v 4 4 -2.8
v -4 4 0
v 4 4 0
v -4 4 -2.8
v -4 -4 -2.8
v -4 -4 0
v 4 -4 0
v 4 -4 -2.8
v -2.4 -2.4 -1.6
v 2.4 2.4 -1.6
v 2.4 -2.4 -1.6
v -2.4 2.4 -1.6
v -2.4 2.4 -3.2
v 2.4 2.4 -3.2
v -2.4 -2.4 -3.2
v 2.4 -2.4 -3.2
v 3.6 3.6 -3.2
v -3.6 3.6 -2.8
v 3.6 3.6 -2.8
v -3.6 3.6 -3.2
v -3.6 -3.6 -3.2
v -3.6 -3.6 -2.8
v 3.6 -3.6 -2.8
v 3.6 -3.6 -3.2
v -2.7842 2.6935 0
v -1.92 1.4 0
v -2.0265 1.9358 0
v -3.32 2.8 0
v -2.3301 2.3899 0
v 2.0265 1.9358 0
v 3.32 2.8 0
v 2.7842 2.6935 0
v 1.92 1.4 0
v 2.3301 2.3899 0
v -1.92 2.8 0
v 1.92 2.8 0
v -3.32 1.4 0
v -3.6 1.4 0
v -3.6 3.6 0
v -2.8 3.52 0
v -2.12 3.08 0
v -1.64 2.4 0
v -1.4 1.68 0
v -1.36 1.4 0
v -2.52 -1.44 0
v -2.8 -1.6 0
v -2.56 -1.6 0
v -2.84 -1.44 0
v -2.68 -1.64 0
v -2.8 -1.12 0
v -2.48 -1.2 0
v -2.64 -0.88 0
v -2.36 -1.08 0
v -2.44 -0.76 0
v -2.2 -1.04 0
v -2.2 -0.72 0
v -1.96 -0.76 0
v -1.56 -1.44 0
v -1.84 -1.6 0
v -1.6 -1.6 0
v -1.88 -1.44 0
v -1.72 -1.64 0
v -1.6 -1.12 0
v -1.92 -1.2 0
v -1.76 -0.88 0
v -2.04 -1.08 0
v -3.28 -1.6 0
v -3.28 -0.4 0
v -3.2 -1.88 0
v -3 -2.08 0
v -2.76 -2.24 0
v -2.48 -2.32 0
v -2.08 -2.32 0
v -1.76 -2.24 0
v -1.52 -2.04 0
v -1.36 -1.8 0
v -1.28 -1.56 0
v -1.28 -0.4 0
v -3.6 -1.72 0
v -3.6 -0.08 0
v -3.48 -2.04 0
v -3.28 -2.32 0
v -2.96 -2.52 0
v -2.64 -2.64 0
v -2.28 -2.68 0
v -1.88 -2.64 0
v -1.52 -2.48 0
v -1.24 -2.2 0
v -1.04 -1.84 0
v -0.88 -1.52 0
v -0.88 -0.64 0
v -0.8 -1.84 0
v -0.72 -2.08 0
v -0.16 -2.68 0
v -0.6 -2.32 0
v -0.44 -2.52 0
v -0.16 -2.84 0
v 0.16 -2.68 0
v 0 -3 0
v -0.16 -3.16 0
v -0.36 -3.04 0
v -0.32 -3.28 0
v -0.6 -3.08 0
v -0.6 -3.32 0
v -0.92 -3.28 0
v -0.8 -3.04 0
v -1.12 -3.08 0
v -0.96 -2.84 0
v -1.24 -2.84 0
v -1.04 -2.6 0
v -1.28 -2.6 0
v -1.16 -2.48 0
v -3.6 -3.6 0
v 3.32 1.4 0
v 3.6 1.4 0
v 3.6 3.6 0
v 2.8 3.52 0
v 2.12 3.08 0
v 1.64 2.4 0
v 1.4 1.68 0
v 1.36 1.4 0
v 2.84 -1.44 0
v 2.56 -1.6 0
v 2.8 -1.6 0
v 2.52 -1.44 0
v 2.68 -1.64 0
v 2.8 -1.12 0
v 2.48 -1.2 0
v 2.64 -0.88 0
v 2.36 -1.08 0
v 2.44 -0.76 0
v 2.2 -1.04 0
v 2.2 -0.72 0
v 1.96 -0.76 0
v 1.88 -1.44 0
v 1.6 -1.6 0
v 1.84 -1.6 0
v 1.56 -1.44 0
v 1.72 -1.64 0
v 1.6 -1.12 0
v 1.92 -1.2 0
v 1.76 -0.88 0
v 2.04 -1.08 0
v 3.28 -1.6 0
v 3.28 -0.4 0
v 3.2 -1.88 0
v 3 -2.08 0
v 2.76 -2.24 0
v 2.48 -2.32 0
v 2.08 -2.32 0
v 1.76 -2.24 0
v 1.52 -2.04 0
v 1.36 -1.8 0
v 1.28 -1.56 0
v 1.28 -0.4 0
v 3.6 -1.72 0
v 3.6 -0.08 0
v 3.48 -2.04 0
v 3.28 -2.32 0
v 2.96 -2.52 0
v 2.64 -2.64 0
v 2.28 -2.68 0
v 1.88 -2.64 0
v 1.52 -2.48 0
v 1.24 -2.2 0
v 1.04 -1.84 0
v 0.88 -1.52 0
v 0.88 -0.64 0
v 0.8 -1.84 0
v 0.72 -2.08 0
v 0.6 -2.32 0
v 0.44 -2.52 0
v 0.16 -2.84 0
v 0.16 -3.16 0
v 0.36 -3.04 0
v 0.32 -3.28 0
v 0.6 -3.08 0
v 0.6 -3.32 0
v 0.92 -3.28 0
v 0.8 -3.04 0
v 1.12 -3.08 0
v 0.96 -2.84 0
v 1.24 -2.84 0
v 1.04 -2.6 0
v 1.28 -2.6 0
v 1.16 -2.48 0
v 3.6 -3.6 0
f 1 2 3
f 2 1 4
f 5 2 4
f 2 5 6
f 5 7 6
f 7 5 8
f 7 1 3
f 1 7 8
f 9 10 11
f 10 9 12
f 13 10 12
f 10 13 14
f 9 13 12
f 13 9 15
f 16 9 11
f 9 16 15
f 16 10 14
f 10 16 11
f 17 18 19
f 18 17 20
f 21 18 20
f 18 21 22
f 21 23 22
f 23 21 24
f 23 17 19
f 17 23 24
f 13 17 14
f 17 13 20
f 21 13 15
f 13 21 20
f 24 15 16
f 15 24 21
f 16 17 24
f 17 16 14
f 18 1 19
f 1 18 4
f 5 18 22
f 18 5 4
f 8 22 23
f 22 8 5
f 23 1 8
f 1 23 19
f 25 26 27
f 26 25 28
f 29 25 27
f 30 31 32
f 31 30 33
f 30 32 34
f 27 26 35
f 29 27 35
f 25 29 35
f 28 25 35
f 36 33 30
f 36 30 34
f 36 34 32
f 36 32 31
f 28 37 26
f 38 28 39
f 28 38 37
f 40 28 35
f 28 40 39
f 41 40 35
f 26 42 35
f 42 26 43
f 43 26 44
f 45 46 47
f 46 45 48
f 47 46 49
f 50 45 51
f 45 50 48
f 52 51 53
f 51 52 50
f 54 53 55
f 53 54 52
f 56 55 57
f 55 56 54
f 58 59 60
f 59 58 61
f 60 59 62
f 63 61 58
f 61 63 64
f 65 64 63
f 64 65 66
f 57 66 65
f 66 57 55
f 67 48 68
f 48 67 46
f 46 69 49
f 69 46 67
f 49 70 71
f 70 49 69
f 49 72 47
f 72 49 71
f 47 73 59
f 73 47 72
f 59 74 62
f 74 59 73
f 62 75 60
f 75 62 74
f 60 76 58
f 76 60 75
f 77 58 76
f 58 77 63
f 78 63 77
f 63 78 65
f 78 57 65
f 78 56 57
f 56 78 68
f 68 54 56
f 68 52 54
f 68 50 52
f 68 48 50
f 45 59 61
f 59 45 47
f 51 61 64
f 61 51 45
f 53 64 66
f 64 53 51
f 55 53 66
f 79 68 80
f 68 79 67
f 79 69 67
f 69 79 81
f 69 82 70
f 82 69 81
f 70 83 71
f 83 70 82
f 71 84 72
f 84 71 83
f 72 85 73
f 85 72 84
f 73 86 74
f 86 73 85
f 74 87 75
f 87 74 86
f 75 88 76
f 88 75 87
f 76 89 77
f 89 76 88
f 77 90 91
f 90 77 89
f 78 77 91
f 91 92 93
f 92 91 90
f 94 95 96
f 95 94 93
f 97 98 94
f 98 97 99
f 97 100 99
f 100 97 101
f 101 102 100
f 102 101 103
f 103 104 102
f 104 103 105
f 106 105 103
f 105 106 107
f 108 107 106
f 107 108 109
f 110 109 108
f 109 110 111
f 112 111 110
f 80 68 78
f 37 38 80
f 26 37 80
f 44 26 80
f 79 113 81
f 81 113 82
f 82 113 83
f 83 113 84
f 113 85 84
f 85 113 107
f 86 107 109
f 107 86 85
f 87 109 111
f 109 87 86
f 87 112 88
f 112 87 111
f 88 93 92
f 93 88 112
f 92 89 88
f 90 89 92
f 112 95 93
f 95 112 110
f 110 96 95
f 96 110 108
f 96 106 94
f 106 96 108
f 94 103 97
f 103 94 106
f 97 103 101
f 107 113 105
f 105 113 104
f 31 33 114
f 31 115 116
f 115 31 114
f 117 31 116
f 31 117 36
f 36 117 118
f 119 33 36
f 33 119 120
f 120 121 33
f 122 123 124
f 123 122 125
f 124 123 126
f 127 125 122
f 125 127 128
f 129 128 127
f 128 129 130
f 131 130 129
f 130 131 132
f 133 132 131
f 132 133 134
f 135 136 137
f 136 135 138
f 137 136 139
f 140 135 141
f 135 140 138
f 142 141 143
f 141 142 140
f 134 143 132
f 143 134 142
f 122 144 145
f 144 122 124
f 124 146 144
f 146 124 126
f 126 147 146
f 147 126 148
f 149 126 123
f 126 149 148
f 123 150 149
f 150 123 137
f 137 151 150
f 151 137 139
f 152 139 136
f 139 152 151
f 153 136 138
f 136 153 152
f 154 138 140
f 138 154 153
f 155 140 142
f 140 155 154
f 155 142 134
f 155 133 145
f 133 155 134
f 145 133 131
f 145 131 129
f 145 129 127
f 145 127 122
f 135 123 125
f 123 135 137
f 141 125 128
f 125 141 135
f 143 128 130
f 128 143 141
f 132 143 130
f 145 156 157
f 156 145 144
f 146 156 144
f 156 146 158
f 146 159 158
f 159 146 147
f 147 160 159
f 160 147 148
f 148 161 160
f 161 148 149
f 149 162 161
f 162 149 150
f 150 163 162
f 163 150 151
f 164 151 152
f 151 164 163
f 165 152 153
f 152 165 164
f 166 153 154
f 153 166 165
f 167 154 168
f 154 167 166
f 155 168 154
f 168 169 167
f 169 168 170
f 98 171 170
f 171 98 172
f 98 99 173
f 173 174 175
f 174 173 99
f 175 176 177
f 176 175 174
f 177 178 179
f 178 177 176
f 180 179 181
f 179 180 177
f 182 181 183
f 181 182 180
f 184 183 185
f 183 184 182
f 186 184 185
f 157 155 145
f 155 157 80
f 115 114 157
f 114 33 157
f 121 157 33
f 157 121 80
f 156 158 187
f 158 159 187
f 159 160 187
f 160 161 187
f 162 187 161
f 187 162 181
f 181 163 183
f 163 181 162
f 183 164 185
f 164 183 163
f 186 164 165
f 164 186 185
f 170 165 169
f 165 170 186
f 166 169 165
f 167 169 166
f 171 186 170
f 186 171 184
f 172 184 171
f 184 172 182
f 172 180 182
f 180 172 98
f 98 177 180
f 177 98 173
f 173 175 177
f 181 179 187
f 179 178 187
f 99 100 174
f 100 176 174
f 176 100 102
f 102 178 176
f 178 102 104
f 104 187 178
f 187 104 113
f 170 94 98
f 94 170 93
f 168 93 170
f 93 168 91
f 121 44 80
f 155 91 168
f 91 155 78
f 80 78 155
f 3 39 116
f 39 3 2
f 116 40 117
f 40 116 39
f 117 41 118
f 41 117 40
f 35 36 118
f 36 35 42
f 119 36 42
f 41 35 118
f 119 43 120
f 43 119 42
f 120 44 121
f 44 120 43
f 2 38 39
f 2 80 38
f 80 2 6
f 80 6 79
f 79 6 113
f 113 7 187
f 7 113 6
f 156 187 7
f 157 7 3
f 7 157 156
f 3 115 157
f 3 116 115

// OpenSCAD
// file: ../p/box5.scad
use <../lib.scad>
function ldraw_lib__box5() = [
// 0 Box with 5 Faces and All Edges
// 0 Name: box5.dat
// 0 Author: James Jessiman
// 0 !LDRAW_ORG Primitive UPDATE 2012-01
// 0 !LICENSE Licensed under CC BY 4.0 : see CAreadme.txt
// 
// 0 BFC CERTIFY CCW
  [0,"BFC","CERTIFY"],
  [0,"BFC","CCW"],
// 
// 0 !HISTORY 2002-04-03 [sbliss] Modified for BFC compliance
// 0 !HISTORY 2002-04-25 [PTadmin] Official Update 2002-02
// 0 !HISTORY 2007-06-24 [PTadmin] Header formatted for Contributor Agreement
// 0 !HISTORY 2008-07-01 [PTadmin] Official Update 2008-01
// 0 !HISTORY 2012-02-16 [Philo] Changed to CCW
// 0 !HISTORY 2012-03-30 [PTadmin] Official Update 2012-01
// 
// 
// 2 24 1 1 1 -1 1 1
  [2,24,1,1,1,-1,1,1],
// 2 24 -1 1 1 -1 1 -1
  [2,24,-1,1,1,-1,1,-1],
// 2 24 -1 1 -1 1 1 -1
  [2,24,-1,1,-1,1,1,-1],
// 2 24 1 1 -1 1 1 1
  [2,24,1,1,-1,1,1,1],
// 2 24 1 0 1 -1 0 1
  [2,24,1,0,1,-1,0,1],
// 2 24 -1 0 1 -1 0 -1
  [2,24,-1,0,1,-1,0,-1],
// 2 24 -1 0 -1 1 0 -1
  [2,24,-1,0,-1,1,0,-1],
// 2 24 1 0 -1 1 0 1
  [2,24,1,0,-1,1,0,1],
// 2 24 1 0 1 1 1 1
  [2,24,1,0,1,1,1,1],
// 2 24 -1 0 1 -1 1 1
  [2,24,-1,0,1,-1,1,1],
// 2 24 1 0 -1 1 1 -1
  [2,24,1,0,-1,1,1,-1],
// 2 24 -1 0 -1 -1 1 -1
  [2,24,-1,0,-1,-1,1,-1],
// 4 16 -1 1 1 1 1 1 1 1 -1 -1 1 -1
  [4,16,-1,1,1,1,1,1,1,1,-1,-1,1,-1],
// 4 16 -1 1 1 -1 0 1 1 0 1 1 1 1
  [4,16,-1,1,1,-1,0,1,1,0,1,1,1,1],
// 4 16 -1 1 -1 -1 0 -1 -1 0 1 -1 1 1
  [4,16,-1,1,-1,-1,0,-1,-1,0,1,-1,1,1],
// 4 16 1 1 -1 1 0 -1 -1 0 -1 -1 1 -1
  [4,16,1,1,-1,1,0,-1,-1,0,-1,-1,1,-1],
// 4 16 1 1 1 1 0 1 1 0 -1 1 1 -1
  [4,16,1,1,1,1,0,1,1,0,-1,1,1,-1],
];
module ldraw_lib__box5(step=0, col=false, unit=2/5, alt=false, line=0.2, solid=!$preview)
    makepoly(ldraw_lib__box5(), step=step, col=col, unit=unit, alt=alt, line=line, solid=solid);
ldraw_lib__box5(line=0.2);
// file: ../p/box4.scad
use <../lib.scad>
function ldraw_lib__box4() = [
// 0 Box with 4 Faces (2 Parallel Pairs) and All Edges
// 0 Name: box4.dat
// 0 Author: James Jessiman
// 0 !LDRAW_ORG Primitive UPDATE 2012-01
// 0 !LICENSE Licensed under CC BY 4.0 : see CAreadme.txt
// 
// 0 BFC CERTIFY CCW
  [0,"BFC","CERTIFY"],
  [0,"BFC","CCW"],
// 
// 0 !HISTORY 2002-04-03 [sbliss] Modified for BFC compliance
// 0 !HISTORY 2002-04-25 [PTadmin] Official Update 2002-02
// 0 !HISTORY 2007-06-24 [PTadmin] Header formatted for Contributor Agreement
// 0 !HISTORY 2008-07-01 [PTadmin] Official Update 2008-01
// 0 !HISTORY 2012-02-16 [Philo] Changed to CCW
// 0 !HISTORY 2012-03-30 [PTadmin] Official Update 2012-01
// 
// 
// 2 24 1 1 1 -1 1 1
  [2,24,1,1,1,-1,1,1],
// 2 24 -1 1 1 -1 1 -1
  [2,24,-1,1,1,-1,1,-1],
// 2 24 -1 1 -1 1 1 -1
  [2,24,-1,1,-1,1,1,-1],
// 2 24 1 1 -1 1 1 1
  [2,24,1,1,-1,1,1,1],
// 2 24 1 0 1 -1 0 1
  [2,24,1,0,1,-1,0,1],
// 2 24 -1 0 1 -1 0 -1
  [2,24,-1,0,1,-1,0,-1],
// 2 24 -1 0 -1 1 0 -1
  [2,24,-1,0,-1,1,0,-1],
// 2 24 1 0 -1 1 0 1
  [2,24,1,0,-1,1,0,1],
// 2 24 1 0 1 1 1 1
  [2,24,1,0,1,1,1,1],
// 2 24 -1 0 1 -1 1 1
  [2,24,-1,0,1,-1,1,1],
// 2 24 1 0 -1 1 1 -1
  [2,24,1,0,-1,1,1,-1],
// 2 24 -1 0 -1 -1 1 -1
  [2,24,-1,0,-1,-1,1,-1],
// 4 16 -1 1 1 -1 0 1 1 0 1 1 1 1
  [4,16,-1,1,1,-1,0,1,1,0,1,1,1,1],
// 4 16 -1 1 -1 -1 0 -1 -1 0 1 -1 1 1
  [4,16,-1,1,-1,-1,0,-1,-1,0,1,-1,1,1],
// 4 16 1 1 -1 1 0 -1 -1 0 -1 -1 1 -1
  [4,16,1,1,-1,1,0,-1,-1,0,-1,-1,1,-1],
// 4 16 1 1 1 1 0 1 1 0 -1 1 1 -1
  [4,16,1,1,1,1,0,1,1,0,-1,1,1,-1],
];
module ldraw_lib__box4(step=0, col=false, unit=2/5, alt=false, line=0.2, solid=!$preview)
    makepoly(ldraw_lib__box4(), step=step, col=col, unit=unit, alt=alt, line=line, solid=solid);
ldraw_lib__box4(line=0.2);
// file: s/3070bs01.scad
use <../../lib.scad>
use <../../p/box4.scad>
use <../../p/box5.scad>
function ldraw_lib__s__3070bs01() = [
// 0 ~Tile  1 x  1 with Groove without Top Face
// 0 Name: s\3070bs01.dat
// 0 Author: Chris Dee [cwdee]
// 0 !LDRAW_ORG Subpart UPDATE 2009-02
// 0 !LICENSE Licensed under CC BY 4.0 : see CAreadme.txt
// 
// 0 BFC CERTIFY CCW
  [0,"BFC","CERTIFY"],
  [0,"BFC","CCW"],
// 
// 0 !HISTORY 2009-09-03 [PTadmin] Official Update 2009-02
// 
// 
// 1 16 0 0 0 10 0 0 0 7 0 0 0 10 box4.dat
  [1,16,0,0,0,10,0,0,0,7,0,0,0,10, ldraw_lib__box4()],
// 0 BFC INVERTNEXT
  [0,"BFC","INVERTNEXT"],
// 1 16 0 8 0 6 0 0 0 -4 0 0 0 6 box5.dat
  [1,16,0,8,0,6,0,0,0,-4,0,0,0,6, ldraw_lib__box5()],
// 1 16 0 7 0 9 0 0 0 1 0 0 0 9 box4.dat
  [1,16,0,7,0,9,0,0,0,1,0,0,0,9, ldraw_lib__box4()],
// 
// 4 16 9 8 9 6 8 6 -6 8 6 -9 8 9
  [4,16,9,8,9,6,8,6,-6,8,6,-9,8,9],
// 4 16 -9 8 9 -6 8 6 -6 8 -6 -9 8 -9
  [4,16,-9,8,9,-6,8,6,-6,8,-6,-9,8,-9],
// 4 16 -9 8 -9 -6 8 -6 6 8 -6 9 8 -9
  [4,16,-9,8,-9,-6,8,-6,6,8,-6,9,8,-9],
// 4 16 9 8 -9 6 8 -6 6 8 6 9 8 9
  [4,16,9,8,-9,6,8,-6,6,8,6,9,8,9],
// 
// 4 16 10 7 10 9 7 9 -9 7 9 -10 7 10
  [4,16,10,7,10,9,7,9,-9,7,9,-10,7,10],
// 4 16 -10 7 10 -9 7 9 -9 7 -9 -10 7 -10
  [4,16,-10,7,10,-9,7,9,-9,7,-9,-10,7,-10],
// 4 16 -10 7 -10 -9 7 -9 9 7 -9 10 7 -10
  [4,16,-10,7,-10,-9,7,-9,9,7,-9,10,7,-10],
// 4 16 10 7 -10 9 7 -9 9 7 9 10 7 10
  [4,16,10,7,-10,9,7,-9,9,7,9,10,7,10],
// 0
];
module ldraw_lib__s__3070bs01(step=0, col=false, unit=2/5, alt=false, line=0.2, solid=!$preview)
    makepoly(ldraw_lib__s__3070bs01(), step=step, col=col, unit=unit, alt=alt, line=line, solid=solid);
ldraw_lib__s__3070bs01(line=0.2);
// file: ../p/1-4ndis.scad
use <../lib.scad>
function ldraw_lib__1_4ndis() = [
// 0 Disc Negative 0.25
// 0 Name: 1-4ndis.dat
// 0 Author: James Jessiman
// 0 !LDRAW_ORG Primitive UPDATE 2012-01
// 0 !LICENSE Licensed under CC BY 4.0 : see CAreadme.txt
// 
// 0 BFC CERTIFY CCW
  [0,"BFC","CERTIFY"],
  [0,"BFC","CCW"],
// 
// 0 !HISTORY 2002-03-23 [sbliss] Added BFC Statement
// 0 !HISTORY 2002-04-25 [PTadmin] Official Update 2002-02
// 0 !HISTORY 2007-06-22 [PTadmin] Header formatted for Contributor Agreement
// 0 !HISTORY 2008-07-01 [PTadmin] Official Update 2008-01
// 0 !HISTORY 2012-02-16 [Philo] Changed to CCW
// 0 !HISTORY 2012-03-30 [PTadmin] Official Update 2012-01
// 
// 
// 3 16 0.9239 0 0.3827 1 0 0 1 0 1
  [3,16,0.9239,0,0.3827,1,0,0,1,0,1],
// 3 16 0.7071 0 0.7071 0.9239 0 0.3827 1 0 1
  [3,16,0.7071,0,0.7071,0.9239,0,0.3827,1,0,1],
// 3 16 0.3827 0 0.9239 0.7071 0 0.7071 1 0 1
  [3,16,0.3827,0,0.9239,0.7071,0,0.7071,1,0,1],
// 3 16 0 0 1 0.3827 0 0.9239 1 0 1
  [3,16,0,0,1,0.3827,0,0.9239,1,0,1],
];
module ldraw_lib__1_4ndis(step=0, col=false, unit=2/5, alt=false, line=0.2, solid=!$preview)
    makepoly(ldraw_lib__1_4ndis(), step=step, col=col, unit=unit, alt=alt, line=line, solid=solid);
ldraw_lib__1_4ndis(line=0.2);
// file: ../p/1-4chrd.scad
use <../lib.scad>
function ldraw_lib__1_4chrd() = [
// 0 Chord 0.25
// 0 Name: 1-4chrd.dat
// 0 Author: Max Martin Richter [MMR1988]
// 0 !LDRAW_ORG Primitive UPDATE 2023-05
// 0 !LICENSE Licensed under CC BY 4.0 : see CAreadme.txt
// 
// 0 BFC CERTIFY CCW
  [0,"BFC","CERTIFY"],
  [0,"BFC","CCW"],
// 
// 0 !HISTORY 2004-04-22 [PTadmin] Official Update 2004-02
// 0 !HISTORY 2007-10-09 [PTadmin] Header formatted for Contributor Agreement
// 0 !HISTORY 2008-07-01 [PTadmin] Official Update 2008-01
// 0 !HISTORY 2012-08-02 [MMR1988] Re-creation with PrimGen2 and Rectifier
// 0 !HISTORY 2012-08-09 [PTadmin] Official Update 2012-02
// 0 !HISTORY 2023-10-27 [OrionP] Change author to MMR1988 from hafhead
// 0 !HISTORY 2023-10-31 [OrionP] Official Update 2023-05
// 
// 4 16 0.9239 0 0.3827 0.3827 0 0.9239 0 0 1 1 0 0
  [4,16,0.9239,0,0.3827,0.3827,0,0.9239,0,0,1,1,0,0],
// 3 16 0.7071 0 0.7071 0.3827 0 0.9239 0.9239 0 0.3827
  [3,16,0.7071,0,0.7071,0.3827,0,0.9239,0.9239,0,0.3827],
];
module ldraw_lib__1_4chrd(step=0, col=false, unit=2/5, alt=false, line=0.2, solid=!$preview)
    makepoly(ldraw_lib__1_4chrd(), step=step, col=col, unit=unit, alt=alt, line=line, solid=solid);
ldraw_lib__1_4chrd(line=0.2);
// main file
use <../lib.scad>
use <../p/1-4chrd.scad>
use <../p/1-4ndis.scad>
use <s/3070bs01.scad>
function ldraw_lib__3070bp1h() = [
// 0 Tile  1 x  1 with Orange Fox Head, Closed Eyes and Blue and Medium Azure Glasses Pattern
// 0 Name: 3070bp1h.dat
// 0 Author: Takeshi Takahashi [RainbowDolphin]
// 0 !LDRAW_ORG Part UPDATE 2025-08
// 0 !LICENSE Licensed under CC BY 4.0 : see CAreadme.txt
// 
// 0 BFC CERTIFY CCW
  [0,"BFC","CERTIFY"],
  [0,"BFC","CCW"],
// 
// 0 !KEYWORDS adventure, BrickLink 3070pb205, Dots, Rebrickable 3070bpr0225
// 0 !KEYWORDS Set 41918
// 
// 0 !HISTORY 2025-08-31 [OrionP] Official Update 2025-08
// 
// 1 16 0 0 0 1 0 0 0 1 0 0 0 1 s\3070bs01.dat
  [1,16,0,0,0,1,0,0,0,1,0,0,0,1, ldraw_lib__s__3070bs01()],
// 1 15 -8.3 0 3.5 3.5 0 0 0 1 0 0 0 3.5 1-4chrd.dat
  [1,15,-8.3,0,3.5,3.5,0,0,0,1,0,0,0,3.5, ldraw_lib__1_4chrd()],
// 1 15 8.3 0 3.5 -3.5 0 0 0 1 0 0 0 3.5 1-4chrd.dat
  [1,15,8.3,0,3.5,-3.5,0,0,0,1,0,0,0,3.5, ldraw_lib__1_4chrd()],
// 1 0 -8.3 0 3.5 3.5 0 0 0 1 0 0 0 3.5 1-4ndis.dat
  [1,0,-8.3,0,3.5,3.5,0,0,0,1,0,0,0,3.5, ldraw_lib__1_4ndis()],
// 1 0 8.3 0 3.5 -3.5 0 0 0 1 0 0 0 3.5 1-4ndis.dat
  [1,0,8.3,0,3.5,-3.5,0,0,0,1,0,0,0,3.5, ldraw_lib__1_4ndis()],
// 3 15 -8.3 0 7 -8.3 0 3.5 -4.8 0 3.5
  [3,15,-8.3,0,7,-8.3,0,3.5,-4.8,0,3.5],
// 4 0 -9 0 3.5 -8.3 0 3.5 -8.3 0 7 -9 0 9
  [4,0,-9,0,3.5,-8.3,0,3.5,-8.3,0,7,-9,0,9],
// 4 0 -7 0 8.8 -9 0 9 -8.3 0 7 -4.8 0 7
  [4,0,-7,0,8.8,-9,0,9,-8.3,0,7,-4.8,0,7],
// 3 0 -5.3 0 7.7 -7 0 8.8 -4.8 0 7
  [3,0,-5.3,0,7.7,-7,0,8.8,-4.8,0,7],
// 4 0 -3.5 0 4.2 -4.1 0 6 -4.8 0 7 -4.8 0 3.5
  [4,0,-3.5,0,4.2,-4.1,0,6,-4.8,0,7,-4.8,0,3.5],
// 3 0 -3.5 0 4.2 -4.8 0 3.5 -3.4 0 3.5
  [3,0,-3.5,0,4.2,-4.8,0,3.5,-3.4,0,3.5],
// 4 0 -6.3 0 -3.6 -7.1 0 -3.6 -7 0 -4 -6.4 0 -4
  [4,0,-6.3,0,-3.6,-7.1,0,-3.6,-7,0,-4,-6.4,0,-4],
// 3 0 -6.4 0 -4 -7 0 -4 -6.7 0 -4.1
  [3,0,-6.4,0,-4,-7,0,-4,-6.7,0,-4.1],
// 4 0 -7 0 -2.8 -7.1 0 -3.6 -6.3 0 -3.6 -6.2 0 -3
  [4,0,-7,0,-2.8,-7.1,0,-3.6,-6.3,0,-3.6,-6.2,0,-3],
// 4 0 -6.6 0 -2.2 -7 0 -2.8 -6.2 0 -3 -5.9 0 -2.7
  [4,0,-6.6,0,-2.2,-7,0,-2.8,-6.2,0,-3,-5.9,0,-2.7],
// 4 0 -6.1 0 -1.9 -6.6 0 -2.2 -5.9 0 -2.7 -5.5 0 -2.6
  [4,0,-6.1,0,-1.9,-6.6,0,-2.2,-5.9,0,-2.7,-5.5,0,-2.6],
// 4 0 -5.5 0 -1.8 -6.1 0 -1.9 -5.5 0 -2.6 -4.9 0 -1.9
  [4,0,-5.5,0,-1.8,-6.1,0,-1.9,-5.5,0,-2.6,-4.9,0,-1.9],
// 4 0 -4 0 -4 -3.9 0 -3.6 -4.7 0 -3.6 -4.6 0 -4
  [4,0,-4,0,-4,-3.9,0,-3.6,-4.7,0,-3.6,-4.6,0,-4],
// 3 0 -4 0 -4 -4.6 0 -4 -4.3 0 -4.1
  [3,0,-4,0,-4,-4.6,0,-4,-4.3,0,-4.1],
// 4 0 -4.7 0 -3.6 -3.9 0 -3.6 -4 0 -2.8 -4.8 0 -3
  [4,0,-4.7,0,-3.6,-3.9,0,-3.6,-4,0,-2.8,-4.8,0,-3],
// 4 0 -4.8 0 -3 -4 0 -2.8 -4.4 0 -2.2 -5.1 0 -2.7
  [4,0,-4.8,0,-3,-4,0,-2.8,-4.4,0,-2.2,-5.1,0,-2.7],
// 4 0 -5.1 0 -2.7 -4.4 0 -2.2 -4.9 0 -1.9 -5.5 0 -2.6
  [4,0,-5.1,0,-2.7,-4.4,0,-2.2,-4.9,0,-1.9,-5.5,0,-2.6],
// 4 322 -7.1 0 -3.6 -8.2 0 -1 -8.2 0 -4 -7 0 -4
  [4,322,-7.1,0,-3.6,-8.2,0,-1,-8.2,0,-4,-7,0,-4],
// 4 322 -7 0 -4 -8.2 0 -4 -8 0 -4.7 -6.7 0 -4.1
  [4,322,-7,0,-4,-8.2,0,-4,-8,0,-4.7,-6.7,0,-4.1],
// 4 322 -6.7 0 -4.1 -8 0 -4.7 -7.5 0 -5.2 -6.9 0 -5.6
  [4,322,-6.7,0,-4.1,-8,0,-4.7,-7.5,0,-5.2,-6.9,0,-5.6],
// 4 322 -6.4 0 -4 -6.7 0 -4.1 -6.9 0 -5.6 -6.2 0 -5.8
  [4,322,-6.4,0,-4,-6.7,0,-4.1,-6.9,0,-5.6,-6.2,0,-5.8],
// 4 322 -4.6 0 -4 -6.4 0 -4 -6.2 0 -5.8 -5.2 0 -5.8
  [4,322,-4.6,0,-4,-6.4,0,-4,-6.2,0,-5.8,-5.2,0,-5.8],
// 4 322 -4.3 0 -4.1 -4.6 0 -4 -5.2 0 -5.8 -4.4 0 -5.6
  [4,322,-4.3,0,-4.1,-4.6,0,-4,-5.2,0,-5.8,-4.4,0,-5.6],
// 4 322 -4 0 -4 -4.3 0 -4.1 -4.4 0 -5.6 -3.8 0 -5.1
  [4,322,-4,0,-4,-4.3,0,-4.1,-4.4,0,-5.6,-3.8,0,-5.1],
// 4 322 -4 0 -4 -3.8 0 -5.1 -3.4 0 -4.5 -3.9 0 -3.6
  [4,322,-4,0,-4,-3.8,0,-5.1,-3.4,0,-4.5,-3.9,0,-3.6],
// 4 322 -3.9 0 -3.6 -3.4 0 -4.5 -3.2 0 -3.9 -4 0 -2.8
  [4,322,-3.9,0,-3.6,-3.4,0,-4.5,-3.2,0,-3.9,-4,0,-2.8],
// 4 322 -4 0 -2.8 -3.2 0 -3.9 -3.2 0 -1 -4.4 0 -2.2
  [4,322,-4,0,-2.8,-3.2,0,-3.9,-3.2,0,-1,-4.4,0,-2.2],
// 3 322 -3.2 0 -1 -4.9 0 -1.9 -4.4 0 -2.2
  [3,322,-3.2,0,-1,-4.9,0,-1.9,-4.4,0,-2.2],
// 4 322 -5.5 0 -1.8 -4.9 0 -1.9 -3.2 0 -1 -8.2 0 -1
  [4,322,-5.5,0,-1.8,-4.9,0,-1.9,-3.2,0,-1,-8.2,0,-1],
// 3 322 -8.2 0 -1 -6.1 0 -1.9 -5.5 0 -1.8
  [3,322,-8.2,0,-1,-6.1,0,-1.9,-5.5,0,-1.8],
// 3 322 -8.2 0 -1 -6.6 0 -2.2 -6.1 0 -1.9
  [3,322,-8.2,0,-1,-6.6,0,-2.2,-6.1,0,-1.9],
// 3 322 -8.2 0 -1 -7 0 -2.8 -6.6 0 -2.2
  [3,322,-8.2,0,-1,-7,0,-2.8,-6.6,0,-2.2],
// 3 322 -8.2 0 -1 -7.1 0 -3.6 -7 0 -2.8
  [3,322,-8.2,0,-1,-7.1,0,-3.6,-7,0,-2.8],
// 4 322 -6.4 0 -4 -4.6 0 -4 -4.7 0 -3.6 -6.3 0 -3.6
  [4,322,-6.4,0,-4,-4.6,0,-4,-4.7,0,-3.6,-6.3,0,-3.6],
// 4 322 -6.3 0 -3.6 -4.7 0 -3.6 -4.8 0 -3 -6.2 0 -3
  [4,322,-6.3,0,-3.6,-4.7,0,-3.6,-4.8,0,-3,-6.2,0,-3],
// 4 322 -6.2 0 -3 -4.8 0 -3 -5.1 0 -2.7 -5.9 0 -2.7
  [4,322,-6.2,0,-3,-4.8,0,-3,-5.1,0,-2.7,-5.9,0,-2.7],
// 3 322 -5.5 0 -2.6 -5.9 0 -2.7 -5.1 0 -2.7
  [3,322,-5.5,0,-2.6,-5.9,0,-2.7,-5.1,0,-2.7],
// 4 1 -8.2 0 -4 -8.2 0 -1 -9 0 -0.2 -9 0 -4.3
  [4,1,-8.2,0,-4,-8.2,0,-1,-9,0,-0.2,-9,0,-4.3],
// 4 1 -8 0 -4.7 -8.2 0 -4 -9 0 -4.3 -8.7 0 -5.1
  [4,1,-8,0,-4.7,-8.2,0,-4,-9,0,-4.3,-8.7,0,-5.1],
// 4 1 -7.5 0 -5.2 -8 0 -4.7 -8.7 0 -5.1 -8.2 0 -5.8
  [4,1,-7.5,0,-5.2,-8,0,-4.7,-8.7,0,-5.1,-8.2,0,-5.8],
// 4 1 -6.9 0 -5.6 -7.5 0 -5.2 -8.2 0 -5.8 -7.4 0 -6.3
  [4,1,-6.9,0,-5.6,-7.5,0,-5.2,-8.2,0,-5.8,-7.4,0,-6.3],
// 4 1 -6.2 0 -5.8 -6.9 0 -5.6 -7.4 0 -6.3 -6.6 0 -6.6
  [4,1,-6.2,0,-5.8,-6.9,0,-5.6,-7.4,0,-6.3,-6.6,0,-6.6],
// 4 1 -5.2 0 -5.8 -6.2 0 -5.8 -6.6 0 -6.6 -5.7 0 -6.7
  [4,1,-5.2,0,-5.8,-6.2,0,-5.8,-6.6,0,-6.6,-5.7,0,-6.7],
// 4 1 -5.2 0 -5.8 -5.7 0 -6.7 -4.7 0 -6.6 -4.4 0 -5.6
  [4,1,-5.2,0,-5.8,-5.7,0,-6.7,-4.7,0,-6.6,-4.4,0,-5.6],
// 4 1 -4.4 0 -5.6 -4.7 0 -6.6 -3.8 0 -6.2 -3.8 0 -5.1
  [4,1,-4.4,0,-5.6,-4.7,0,-6.6,-3.8,0,-6.2,-3.8,0,-5.1],
// 4 1 -3.8 0 -5.1 -3.8 0 -6.2 -3.1 0 -5.5 -3.4 0 -4.5
  [4,1,-3.8,0,-5.1,-3.8,0,-6.2,-3.1,0,-5.5,-3.4,0,-4.5],
// 4 1 -3.4 0 -4.5 -3.1 0 -5.5 -2.6 0 -4.6 -3.2 0 -3.9
  [4,1,-3.4,0,-4.5,-3.1,0,-5.5,-2.6,0,-4.6,-3.2,0,-3.9],
// 4 1 -3.2 0 -3.9 -2.6 0 -4.6 -2.2 0 -3.8 -2.2 0 -1.6
  [4,1,-3.2,0,-3.9,-2.6,0,-4.6,-2.2,0,-3.8,-2.2,0,-1.6],
// 3 1 -3.2 0 -1 -3.2 0 -3.9 -2.2 0 -1.6
  [3,1,-3.2,0,-1,-3.2,0,-3.9,-2.2,0,-1.6],
// 4 25 -2.2 0 -1.6 -2.2 0 -3.8 -2 0 -4.6 -1.8 0 -5.2
  [4,25,-2.2,0,-1.6,-2.2,0,-3.8,-2,0,-4.6,-1.8,0,-5.2],
// 4 0 -0.4 0 -6.7 -1.8 0 -5.2 -1.5 0 -5.8 -1.1 0 -6.3
  [4,0,-0.4,0,-6.7,-1.8,0,-5.2,-1.5,0,-5.8,-1.1,0,-6.3],
// 4 0 -0.4 0 -6.7 -0.4 0 -7.1 0 0 -7.5 0.4 0 -6.7
  [4,0,-0.4,0,-6.7,-0.4,0,-7.1,0,0,-7.5,0.4,0,-6.7],
// 4 0 -0.4 0 -7.9 0 0 -7.5 -0.4 0 -7.1 -0.9 0 -7.6
  [4,0,-0.4,0,-7.9,0,0,-7.5,-0.4,0,-7.1,-0.9,0,-7.6],
// 4 0 -0.8 0 -8.2 -0.4 0 -7.9 -0.9 0 -7.6 -1.5 0 -7.7
  [4,0,-0.8,0,-8.2,-0.4,0,-7.9,-0.9,0,-7.6,-1.5,0,-7.7],
// 4 0 -1.5 0 -8.3 -0.8 0 -8.2 -1.5 0 -7.7 -2.3 0 -8.2
  [4,0,-1.5,0,-8.3,-0.8,0,-8.2,-1.5,0,-7.7,-2.3,0,-8.2],
// 4 0 -2.3 0 -8.2 -1.5 0 -7.7 -2 0 -7.6 -2.8 0 -7.7
  [4,0,-2.3,0,-8.2,-1.5,0,-7.7,-2,0,-7.6,-2.8,0,-7.7],
// 4 0 -2.8 0 -7.7 -2 0 -7.6 -2.4 0 -7.1 -3.1 0 -7.1
  [4,0,-2.8,0,-7.7,-2,0,-7.6,-2.4,0,-7.1,-3.1,0,-7.1],
// 4 0 -3.1 0 -7.1 -2.4 0 -7.1 -2.6 0 -6.5 -3.2 0 -6.5
  [4,0,-3.1,0,-7.1,-2.4,0,-7.1,-2.6,0,-6.5,-3.2,0,-6.5],
// 3 0 -2.9 0 -6.2 -3.2 0 -6.5 -2.6 0 -6.5
  [3,0,-2.9,0,-6.2,-3.2,0,-6.5,-2.6,0,-6.5],
// 3 1 -9 0 -0.2 -8.2 0 -1 -3.2 0 -1
  [3,1,-9,0,-0.2,-8.2,0,-1,-3.2,0,-1],
// 3 25 -8.3 0 3.5 -9 0 3.5 -9 0 -0.2
  [3,25,-8.3,0,3.5,-9,0,3.5,-9,0,-0.2],
// 3 25 -4.8 0 3.5 -8.3 0 3.5 -9 0 -0.2
  [3,25,-4.8,0,3.5,-8.3,0,3.5,-9,0,-0.2],
// 3 25 -3.4 0 3.5 -4.8 0 3.5 -9 0 -0.2
  [3,25,-3.4,0,3.5,-4.8,0,3.5,-9,0,-0.2],
// 3 15 -9 0 -4.3 -9 0 -9 -8.7 0 -5.1
  [3,15,-9,0,-4.3,-9,0,-9,-8.7,0,-5.1],
// 3 15 -8.7 0 -5.1 -9 0 -9 -8.2 0 -5.8
  [3,15,-8.7,0,-5.1,-9,0,-9,-8.2,0,-5.8],
// 3 15 -8.2 0 -5.8 -9 0 -9 -7.4 0 -6.3
  [3,15,-8.2,0,-5.8,-9,0,-9,-7.4,0,-6.3],
// 3 15 -7.4 0 -6.3 -9 0 -9 -6.6 0 -6.6
  [3,15,-7.4,0,-6.3,-9,0,-9,-6.6,0,-6.6],
// 4 15 -5.7 0 -6.7 -6.6 0 -6.6 -9 0 -9 -2.8 0 -7.7
  [4,15,-5.7,0,-6.7,-6.6,0,-6.6,-9,0,-9,-2.8,0,-7.7],
// 4 15 -5.7 0 -6.7 -2.8 0 -7.7 -3.1 0 -7.1 -4.7 0 -6.6
  [4,15,-5.7,0,-6.7,-2.8,0,-7.7,-3.1,0,-7.1,-4.7,0,-6.6],
// 4 15 -4.7 0 -6.6 -3.1 0 -7.1 -3.2 0 -6.5 -3.8 0 -6.2
  [4,15,-4.7,0,-6.6,-3.1,0,-7.1,-3.2,0,-6.5,-3.8,0,-6.2],
// 4 15 -3.8 0 -6.2 -3.2 0 -6.5 -2.9 0 -6.2 -3.1 0 -5.5
  [4,15,-3.8,0,-6.2,-3.2,0,-6.5,-2.9,0,-6.2,-3.1,0,-5.5],
// 4 15 -3.1 0 -5.5 -2.9 0 -6.2 -1.8 0 -5.2 -2 0 -4.6
  [4,15,-3.1,0,-5.5,-2.9,0,-6.2,-1.8,0,-5.2,-2,0,-4.6],
// 3 15 -2 0 -4.6 -2.6 0 -4.6 -3.1 0 -5.5
  [3,15,-2,0,-4.6,-2.6,0,-4.6,-3.1,0,-5.5],
// 3 15 -2.2 0 -3.8 -2.6 0 -4.6 -2 0 -4.6
  [3,15,-2.2,0,-3.8,-2.6,0,-4.6,-2,0,-4.6],
// 4 15 -1.5 0 -5.8 -1.8 0 -5.2 -2.9 0 -6.2 -2.6 0 -6.5
  [4,15,-1.5,0,-5.8,-1.8,0,-5.2,-2.9,0,-6.2,-2.6,0,-6.5],
// 4 15 -1.1 0 -6.3 -1.5 0 -5.8 -2.6 0 -6.5 -2.4 0 -7.1
  [4,15,-1.1,0,-6.3,-1.5,0,-5.8,-2.6,0,-6.5,-2.4,0,-7.1],
// 4 15 -0.4 0 -6.7 -1.1 0 -6.3 -2.4 0 -7.1 -2 0 -7.6
  [4,15,-0.4,0,-6.7,-1.1,0,-6.3,-2.4,0,-7.1,-2,0,-7.6],
// 4 15 -0.4 0 -7.1 -0.4 0 -6.7 -2 0 -7.6 -1.5 0 -7.7
  [4,15,-0.4,0,-7.1,-0.4,0,-6.7,-2,0,-7.6,-1.5,0,-7.7],
// 3 15 -0.4 0 -7.1 -1.5 0 -7.7 -0.9 0 -7.6
  [3,15,-0.4,0,-7.1,-1.5,0,-7.7,-0.9,0,-7.6],
// 3 15 -2.8 0 -7.7 -9 0 -9 -2.3 0 -8.2
  [3,15,-2.8,0,-7.7,-9,0,-9,-2.3,0,-8.2],
// 3 15 -2.3 0 -8.2 -9 0 -9 -1.5 0 -8.3
  [3,15,-2.3,0,-8.2,-9,0,-9,-1.5,0,-8.3],
// 3 15 8.3 0 7 4.8 0 3.5 8.3 0 3.5
  [3,15,8.3,0,7,4.8,0,3.5,8.3,0,3.5],
// 4 0 8.3 0 7 8.3 0 3.5 9 0 3.5 9 0 9
  [4,0,8.3,0,7,8.3,0,3.5,9,0,3.5,9,0,9],
// 4 0 8.3 0 7 9 0 9 7 0 8.8 4.8 0 7
  [4,0,8.3,0,7,9,0,9,7,0,8.8,4.8,0,7],
// 3 0 4.8 0 7 7 0 8.8 5.3 0 7.7
  [3,0,4.8,0,7,7,0,8.8,5.3,0,7.7],
// 4 0 4.8 0 7 4.1 0 6 3.5 0 4.2 4.8 0 3.5
  [4,0,4.8,0,7,4.1,0,6,3.5,0,4.2,4.8,0,3.5],
// 3 0 3.5 0 4.2 3.4 0 3.5 4.8 0 3.5
  [3,0,3.5,0,4.2,3.4,0,3.5,4.8,0,3.5],
// 4 0 7 0 -4 7.1 0 -3.6 6.3 0 -3.6 6.4 0 -4
  [4,0,7,0,-4,7.1,0,-3.6,6.3,0,-3.6,6.4,0,-4],
// 3 0 7 0 -4 6.4 0 -4 6.7 0 -4.1
  [3,0,7,0,-4,6.4,0,-4,6.7,0,-4.1],
// 4 0 6.3 0 -3.6 7.1 0 -3.6 7 0 -2.8 6.2 0 -3
  [4,0,6.3,0,-3.6,7.1,0,-3.6,7,0,-2.8,6.2,0,-3],
// 4 0 6.2 0 -3 7 0 -2.8 6.6 0 -2.2 5.9 0 -2.7
  [4,0,6.2,0,-3,7,0,-2.8,6.6,0,-2.2,5.9,0,-2.7],
// 4 0 5.9 0 -2.7 6.6 0 -2.2 6.1 0 -1.9 5.5 0 -2.6
  [4,0,5.9,0,-2.7,6.6,0,-2.2,6.1,0,-1.9,5.5,0,-2.6],
// 4 0 5.5 0 -2.6 6.1 0 -1.9 5.5 0 -1.8 4.9 0 -1.9
  [4,0,5.5,0,-2.6,6.1,0,-1.9,5.5,0,-1.8,4.9,0,-1.9],
// 4 0 4.7 0 -3.6 3.9 0 -3.6 4 0 -4 4.6 0 -4
  [4,0,4.7,0,-3.6,3.9,0,-3.6,4,0,-4,4.6,0,-4],
// 3 0 4.6 0 -4 4 0 -4 4.3 0 -4.1
  [3,0,4.6,0,-4,4,0,-4,4.3,0,-4.1],
// 4 0 4 0 -2.8 3.9 0 -3.6 4.7 0 -3.6 4.8 0 -3
  [4,0,4,0,-2.8,3.9,0,-3.6,4.7,0,-3.6,4.8,0,-3],
// 4 0 4.4 0 -2.2 4 0 -2.8 4.8 0 -3 5.1 0 -2.7
  [4,0,4.4,0,-2.2,4,0,-2.8,4.8,0,-3,5.1,0,-2.7],
// 4 0 4.9 0 -1.9 4.4 0 -2.2 5.1 0 -2.7 5.5 0 -2.6
  [4,0,4.9,0,-1.9,4.4,0,-2.2,5.1,0,-2.7,5.5,0,-2.6],
// 4 322 8.2 0 -4 8.2 0 -1 7.1 0 -3.6 7 0 -4
  [4,322,8.2,0,-4,8.2,0,-1,7.1,0,-3.6,7,0,-4],
// 4 322 8 0 -4.7 8.2 0 -4 7 0 -4 6.7 0 -4.1
  [4,322,8,0,-4.7,8.2,0,-4,7,0,-4,6.7,0,-4.1],
// 4 322 7.5 0 -5.2 8 0 -4.7 6.7 0 -4.1 6.9 0 -5.6
  [4,322,7.5,0,-5.2,8,0,-4.7,6.7,0,-4.1,6.9,0,-5.6],
// 4 322 6.9 0 -5.6 6.7 0 -4.1 6.4 0 -4 6.2 0 -5.8
  [4,322,6.9,0,-5.6,6.7,0,-4.1,6.4,0,-4,6.2,0,-5.8],
// 4 322 6.2 0 -5.8 6.4 0 -4 4.6 0 -4 5.2 0 -5.8
  [4,322,6.2,0,-5.8,6.4,0,-4,4.6,0,-4,5.2,0,-5.8],
// 4 322 5.2 0 -5.8 4.6 0 -4 4.3 0 -4.1 4.4 0 -5.6
  [4,322,5.2,0,-5.8,4.6,0,-4,4.3,0,-4.1,4.4,0,-5.6],
// 4 322 4.4 0 -5.6 4.3 0 -4.1 4 0 -4 3.8 0 -5.1
  [4,322,4.4,0,-5.6,4.3,0,-4.1,4,0,-4,3.8,0,-5.1],
// 4 322 3.4 0 -4.5 3.8 0 -5.1 4 0 -4 3.9 0 -3.6
  [4,322,3.4,0,-4.5,3.8,0,-5.1,4,0,-4,3.9,0,-3.6],
// 4 322 3.2 0 -3.9 3.4 0 -4.5 3.9 0 -3.6 4 0 -2.8
  [4,322,3.2,0,-3.9,3.4,0,-4.5,3.9,0,-3.6,4,0,-2.8],
// 4 322 3.2 0 -1 3.2 0 -3.9 4 0 -2.8 4.4 0 -2.2
  [4,322,3.2,0,-1,3.2,0,-3.9,4,0,-2.8,4.4,0,-2.2],
// 3 322 3.2 0 -1 4.4 0 -2.2 4.9 0 -1.9
  [3,322,3.2,0,-1,4.4,0,-2.2,4.9,0,-1.9],
// 4 322 3.2 0 -1 4.9 0 -1.9 5.5 0 -1.8 8.2 0 -1
  [4,322,3.2,0,-1,4.9,0,-1.9,5.5,0,-1.8,8.2,0,-1],
// 3 322 8.2 0 -1 5.5 0 -1.8 6.1 0 -1.9
  [3,322,8.2,0,-1,5.5,0,-1.8,6.1,0,-1.9],
// 3 322 8.2 0 -1 6.1 0 -1.9 6.6 0 -2.2
  [3,322,8.2,0,-1,6.1,0,-1.9,6.6,0,-2.2],
// 3 322 8.2 0 -1 6.6 0 -2.2 7 0 -2.8
  [3,322,8.2,0,-1,6.6,0,-2.2,7,0,-2.8],
// 3 322 8.2 0 -1 7 0 -2.8 7.1 0 -3.6
  [3,322,8.2,0,-1,7,0,-2.8,7.1,0,-3.6],
// 4 322 4.7 0 -3.6 4.6 0 -4 6.4 0 -4 6.3 0 -3.6
  [4,322,4.7,0,-3.6,4.6,0,-4,6.4,0,-4,6.3,0,-3.6],
// 4 322 4.8 0 -3 4.7 0 -3.6 6.3 0 -3.6 6.2 0 -3
  [4,322,4.8,0,-3,4.7,0,-3.6,6.3,0,-3.6,6.2,0,-3],
// 4 322 5.1 0 -2.7 4.8 0 -3 6.2 0 -3 5.9 0 -2.7
  [4,322,5.1,0,-2.7,4.8,0,-3,6.2,0,-3,5.9,0,-2.7],
// 3 322 5.5 0 -2.6 5.1 0 -2.7 5.9 0 -2.7
  [3,322,5.5,0,-2.6,5.1,0,-2.7,5.9,0,-2.7],
// 4 1 9 0 -0.2 8.2 0 -1 8.2 0 -4 9 0 -4.3
  [4,1,9,0,-0.2,8.2,0,-1,8.2,0,-4,9,0,-4.3],
// 4 1 9 0 -4.3 8.2 0 -4 8 0 -4.7 8.7 0 -5.1
  [4,1,9,0,-4.3,8.2,0,-4,8,0,-4.7,8.7,0,-5.1],
// 4 1 8.7 0 -5.1 8 0 -4.7 7.5 0 -5.2 8.2 0 -5.8
  [4,1,8.7,0,-5.1,8,0,-4.7,7.5,0,-5.2,8.2,0,-5.8],
// 4 1 8.2 0 -5.8 7.5 0 -5.2 6.9 0 -5.6 7.4 0 -6.3
  [4,1,8.2,0,-5.8,7.5,0,-5.2,6.9,0,-5.6,7.4,0,-6.3],
// 4 1 7.4 0 -6.3 6.9 0 -5.6 6.2 0 -5.8 6.6 0 -6.6
  [4,1,7.4,0,-6.3,6.9,0,-5.6,6.2,0,-5.8,6.6,0,-6.6],
// 4 1 6.6 0 -6.6 6.2 0 -5.8 5.2 0 -5.8 5.7 0 -6.7
  [4,1,6.6,0,-6.6,6.2,0,-5.8,5.2,0,-5.8,5.7,0,-6.7],
// 4 1 4.7 0 -6.6 5.7 0 -6.7 5.2 0 -5.8 4.4 0 -5.6
  [4,1,4.7,0,-6.6,5.7,0,-6.7,5.2,0,-5.8,4.4,0,-5.6],
// 4 1 3.8 0 -6.2 4.7 0 -6.6 4.4 0 -5.6 3.8 0 -5.1
  [4,1,3.8,0,-6.2,4.7,0,-6.6,4.4,0,-5.6,3.8,0,-5.1],
// 4 1 3.1 0 -5.5 3.8 0 -6.2 3.8 0 -5.1 3.4 0 -4.5
  [4,1,3.1,0,-5.5,3.8,0,-6.2,3.8,0,-5.1,3.4,0,-4.5],
// 4 1 2.6 0 -4.6 3.1 0 -5.5 3.4 0 -4.5 3.2 0 -3.9
  [4,1,2.6,0,-4.6,3.1,0,-5.5,3.4,0,-4.5,3.2,0,-3.9],
// 4 1 2.2 0 -3.8 2.6 0 -4.6 3.2 0 -3.9 2.2 0 -1.6
  [4,1,2.2,0,-3.8,2.6,0,-4.6,3.2,0,-3.9,2.2,0,-1.6],
// 3 1 3.2 0 -1 2.2 0 -1.6 3.2 0 -3.9
  [3,1,3.2,0,-1,2.2,0,-1.6,3.2,0,-3.9],
// 4 25 2 0 -4.6 2.2 0 -3.8 2.2 0 -1.6 1.8 0 -5.2
  [4,25,2,0,-4.6,2.2,0,-3.8,2.2,0,-1.6,1.8,0,-5.2],
// 4 0 1.5 0 -5.8 1.8 0 -5.2 0.4 0 -6.7 1.1 0 -6.3
  [4,0,1.5,0,-5.8,1.8,0,-5.2,0.4,0,-6.7,1.1,0,-6.3],
// 3 0 0.4 0 -6.7 0 0 -7.5 0.4 0 -7.1
  [3,0,0.4,0,-6.7,0,0,-7.5,0.4,0,-7.1],
// 4 0 0.4 0 -7.1 0 0 -7.5 0.4 0 -7.9 0.9 0 -7.6
  [4,0,0.4,0,-7.1,0,0,-7.5,0.4,0,-7.9,0.9,0,-7.6],
// 4 0 0.9 0 -7.6 0.4 0 -7.9 0.8 0 -8.2 1.5 0 -7.7
  [4,0,0.9,0,-7.6,0.4,0,-7.9,0.8,0,-8.2,1.5,0,-7.7],
// 4 0 1.5 0 -7.7 0.8 0 -8.2 1.5 0 -8.3 2.3 0 -8.2
  [4,0,1.5,0,-7.7,0.8,0,-8.2,1.5,0,-8.3,2.3,0,-8.2],
// 4 0 2 0 -7.6 1.5 0 -7.7 2.3 0 -8.2 2.8 0 -7.7
  [4,0,2,0,-7.6,1.5,0,-7.7,2.3,0,-8.2,2.8,0,-7.7],
// 4 0 2.4 0 -7.1 2 0 -7.6 2.8 0 -7.7 3.1 0 -7.1
  [4,0,2.4,0,-7.1,2,0,-7.6,2.8,0,-7.7,3.1,0,-7.1],
// 4 0 2.6 0 -6.5 2.4 0 -7.1 3.1 0 -7.1 3.2 0 -6.5
  [4,0,2.6,0,-6.5,2.4,0,-7.1,3.1,0,-7.1,3.2,0,-6.5],
// 3 0 2.9 0 -6.2 2.6 0 -6.5 3.2 0 -6.5
  [3,0,2.9,0,-6.2,2.6,0,-6.5,3.2,0,-6.5],
// 4 1 3.2 0 -1 8.2 0 -1 9 0 -0.2 -9 0 -0.2
  [4,1,3.2,0,-1,8.2,0,-1,9,0,-0.2,-9,0,-0.2],
// 3 25 9 0 3.5 8.3 0 3.5 9 0 -0.2
  [3,25,9,0,3.5,8.3,0,3.5,9,0,-0.2],
// 3 25 8.3 0 3.5 4.8 0 3.5 9 0 -0.2
  [3,25,8.3,0,3.5,4.8,0,3.5,9,0,-0.2],
// 4 25 9 0 -0.2 4.8 0 3.5 3.4 0 3.5 -9 0 -0.2
  [4,25,9,0,-0.2,4.8,0,3.5,3.4,0,3.5,-9,0,-0.2],
// 3 15 9 0 -4.3 8.7 0 -5.1 9 0 -9
  [3,15,9,0,-4.3,8.7,0,-5.1,9,0,-9],
// 3 15 8.7 0 -5.1 8.2 0 -5.8 9 0 -9
  [3,15,8.7,0,-5.1,8.2,0,-5.8,9,0,-9],
// 3 15 8.2 0 -5.8 7.4 0 -6.3 9 0 -9
  [3,15,8.2,0,-5.8,7.4,0,-6.3,9,0,-9],
// 3 15 7.4 0 -6.3 6.6 0 -6.6 9 0 -9
  [3,15,7.4,0,-6.3,6.6,0,-6.6,9,0,-9],
// 4 15 9 0 -9 6.6 0 -6.6 5.7 0 -6.7 2.8 0 -7.7
  [4,15,9,0,-9,6.6,0,-6.6,5.7,0,-6.7,2.8,0,-7.7],
// 4 15 3.1 0 -7.1 2.8 0 -7.7 5.7 0 -6.7 4.7 0 -6.6
  [4,15,3.1,0,-7.1,2.8,0,-7.7,5.7,0,-6.7,4.7,0,-6.6],
// 4 15 3.2 0 -6.5 3.1 0 -7.1 4.7 0 -6.6 3.8 0 -6.2
  [4,15,3.2,0,-6.5,3.1,0,-7.1,4.7,0,-6.6,3.8,0,-6.2],
// 4 15 2.9 0 -6.2 3.2 0 -6.5 3.8 0 -6.2 3.1 0 -5.5
  [4,15,2.9,0,-6.2,3.2,0,-6.5,3.8,0,-6.2,3.1,0,-5.5],
// 4 15 1.8 0 -5.2 2.9 0 -6.2 3.1 0 -5.5 2 0 -4.6
  [4,15,1.8,0,-5.2,2.9,0,-6.2,3.1,0,-5.5,2,0,-4.6],
// 3 15 2.6 0 -4.6 2 0 -4.6 3.1 0 -5.5
  [3,15,2.6,0,-4.6,2,0,-4.6,3.1,0,-5.5],
// 3 15 2.2 0 -3.8 2 0 -4.6 2.6 0 -4.6
  [3,15,2.2,0,-3.8,2,0,-4.6,2.6,0,-4.6],
// 4 15 2.9 0 -6.2 1.8 0 -5.2 1.5 0 -5.8 2.6 0 -6.5
  [4,15,2.9,0,-6.2,1.8,0,-5.2,1.5,0,-5.8,2.6,0,-6.5],
// 4 15 2.6 0 -6.5 1.5 0 -5.8 1.1 0 -6.3 2.4 0 -7.1
  [4,15,2.6,0,-6.5,1.5,0,-5.8,1.1,0,-6.3,2.4,0,-7.1],
// 4 15 2.4 0 -7.1 1.1 0 -6.3 0.4 0 -6.7 2 0 -7.6
  [4,15,2.4,0,-7.1,1.1,0,-6.3,0.4,0,-6.7,2,0,-7.6],
// 4 15 2 0 -7.6 0.4 0 -6.7 0.4 0 -7.1 1.5 0 -7.7
  [4,15,2,0,-7.6,0.4,0,-6.7,0.4,0,-7.1,1.5,0,-7.7],
// 3 15 0.4 0 -7.1 0.9 0 -7.6 1.5 0 -7.7
  [3,15,0.4,0,-7.1,0.9,0,-7.6,1.5,0,-7.7],
// 3 15 2.8 0 -7.7 2.3 0 -8.2 9 0 -9
  [3,15,2.8,0,-7.7,2.3,0,-8.2,9,0,-9],
// 3 15 2.3 0 -8.2 1.5 0 -8.3 9 0 -9
  [3,15,2.3,0,-8.2,1.5,0,-8.3,9,0,-9],
// 3 15 0 0 -7.5 -0.4 0 -7.9 0.4 0 -7.9
  [3,15,0,0,-7.5,-0.4,0,-7.9,0.4,0,-7.9],
// 4 15 0.4 0 -7.9 -0.4 0 -7.9 -0.8 0 -8.2 0.8 0 -8.2
  [4,15,0.4,0,-7.9,-0.4,0,-7.9,-0.8,0,-8.2,0.8,0,-8.2],
// 4 15 0.8 0 -8.2 -0.8 0 -8.2 -1.5 0 -8.3 1.5 0 -8.3
  [4,15,0.8,0,-8.2,-0.8,0,-8.2,-1.5,0,-8.3,1.5,0,-8.3],
// 4 15 1.5 0 -8.3 -1.5 0 -8.3 -9 0 -9 9 0 -9
  [4,15,1.5,0,-8.3,-1.5,0,-8.3,-9,0,-9,9,0,-9],
// 4 0 -1.8 0 -5.2 -0.4 0 -6.7 0.4 0 -6.7 1.8 0 -5.2
  [4,0,-1.8,0,-5.2,-0.4,0,-6.7,0.4,0,-6.7,1.8,0,-5.2],
// 4 25 -2.2 0 -1.6 -1.8 0 -5.2 1.8 0 -5.2 2.2 0 -1.6
  [4,25,-2.2,0,-1.6,-1.8,0,-5.2,1.8,0,-5.2,2.2,0,-1.6],
// 3 25 3.4 0 3.5 -3.4 0 3.5 -9 0 -0.2
  [3,25,3.4,0,3.5,-3.4,0,3.5,-9,0,-0.2],
// 4 1 -3.2 0 -1 -2.2 0 -1.6 2.2 0 -1.6 3.2 0 -1
  [4,1,-3.2,0,-1,-2.2,0,-1.6,2.2,0,-1.6,3.2,0,-1],
// 3 1 -9 0 -0.2 -3.2 0 -1 3.2 0 -1
  [3,1,-9,0,-0.2,-3.2,0,-1,3.2,0,-1],
// 4 16 10 0 10 -10 0 10 -9 0 9 9 0 9
  [4,16,10,0,10,-10,0,10,-9,0,9,9,0,9],
// 4 16 9 0 9 -9 0 9 -7 0 8.8 7 0 8.8
  [4,16,9,0,9,-9,0,9,-7,0,8.8,7,0,8.8],
// 4 16 7 0 8.8 -7 0 8.8 -5.3 0 7.7 5.3 0 7.7
  [4,16,7,0,8.8,-7,0,8.8,-5.3,0,7.7,5.3,0,7.7],
// 4 16 5.3 0 7.7 -4.8 0 7 -4.1 0 6 4.8 0 7
  [4,16,5.3,0,7.7,-4.8,0,7,-4.1,0,6,4.8,0,7],
// 3 16 4.1 0 6 4.8 0 7 -4.1 0 6
  [3,16,4.1,0,6,4.8,0,7,-4.1,0,6],
// 3 16 -5.3 0 7.7 -4.8 0 7 5.3 0 7.7
  [3,16,-5.3,0,7.7,-4.8,0,7,5.3,0,7.7],
// 4 16 4.1 0 6 -4.1 0 6 -3.5 0 4.2 3.5 0 4.2
  [4,16,4.1,0,6,-4.1,0,6,-3.5,0,4.2,3.5,0,4.2],
// 4 16 3.5 0 4.2 -3.5 0 4.2 -3.4 0 3.5 3.4 0 3.5
  [4,16,3.5,0,4.2,-3.5,0,4.2,-3.4,0,3.5,3.4,0,3.5],
// 3 16 -10 0 10 -9 0 3.5 -9 0 9
  [3,16,-10,0,10,-9,0,3.5,-9,0,9],
// 4 16 -9 0 -0.2 -9 0 3.5 -10 0 10 -10 0 -10
  [4,16,-9,0,-0.2,-9,0,3.5,-10,0,10,-10,0,-10],
// 3 16 -9 0 -0.2 -10 0 -10 -9 0 -4.3
  [3,16,-9,0,-0.2,-10,0,-10,-9,0,-4.3],
// 3 16 -9 0 -4.3 -10 0 -10 -9 0 -9
  [3,16,-9,0,-4.3,-10,0,-10,-9,0,-9],
// 4 16 9 0 -9 -9 0 -9 -10 0 -10 10 0 -10
  [4,16,9,0,-9,-9,0,-9,-10,0,-10,10,0,-10],
// 3 16 9 0 -4.3 9 0 -9 10 0 -10
  [3,16,9,0,-4.3,9,0,-9,10,0,-10],
// 4 16 9 0 -0.2 9 0 -4.3 10 0 -10 10 0 10
  [4,16,9,0,-0.2,9,0,-4.3,10,0,-10,10,0,10],
// 3 16 10 0 10 9 0 3.5 9 0 -0.2
  [3,16,10,0,10,9,0,3.5,9,0,-0.2],
// 3 16 10 0 10 9 0 9 9 0 3.5
  [3,16,10,0,10,9,0,9,9,0,3.5],
];
module ldraw_lib__3070bp1h(step=0, col=false, unit=2/5, alt=false, line=0.2, solid=!$preview)
    makepoly(ldraw_lib__3070bp1h(), step=step, col=col, unit=unit, alt=alt, line=line, solid=solid);
ldraw_lib__3070bp1h(line=0.2);
